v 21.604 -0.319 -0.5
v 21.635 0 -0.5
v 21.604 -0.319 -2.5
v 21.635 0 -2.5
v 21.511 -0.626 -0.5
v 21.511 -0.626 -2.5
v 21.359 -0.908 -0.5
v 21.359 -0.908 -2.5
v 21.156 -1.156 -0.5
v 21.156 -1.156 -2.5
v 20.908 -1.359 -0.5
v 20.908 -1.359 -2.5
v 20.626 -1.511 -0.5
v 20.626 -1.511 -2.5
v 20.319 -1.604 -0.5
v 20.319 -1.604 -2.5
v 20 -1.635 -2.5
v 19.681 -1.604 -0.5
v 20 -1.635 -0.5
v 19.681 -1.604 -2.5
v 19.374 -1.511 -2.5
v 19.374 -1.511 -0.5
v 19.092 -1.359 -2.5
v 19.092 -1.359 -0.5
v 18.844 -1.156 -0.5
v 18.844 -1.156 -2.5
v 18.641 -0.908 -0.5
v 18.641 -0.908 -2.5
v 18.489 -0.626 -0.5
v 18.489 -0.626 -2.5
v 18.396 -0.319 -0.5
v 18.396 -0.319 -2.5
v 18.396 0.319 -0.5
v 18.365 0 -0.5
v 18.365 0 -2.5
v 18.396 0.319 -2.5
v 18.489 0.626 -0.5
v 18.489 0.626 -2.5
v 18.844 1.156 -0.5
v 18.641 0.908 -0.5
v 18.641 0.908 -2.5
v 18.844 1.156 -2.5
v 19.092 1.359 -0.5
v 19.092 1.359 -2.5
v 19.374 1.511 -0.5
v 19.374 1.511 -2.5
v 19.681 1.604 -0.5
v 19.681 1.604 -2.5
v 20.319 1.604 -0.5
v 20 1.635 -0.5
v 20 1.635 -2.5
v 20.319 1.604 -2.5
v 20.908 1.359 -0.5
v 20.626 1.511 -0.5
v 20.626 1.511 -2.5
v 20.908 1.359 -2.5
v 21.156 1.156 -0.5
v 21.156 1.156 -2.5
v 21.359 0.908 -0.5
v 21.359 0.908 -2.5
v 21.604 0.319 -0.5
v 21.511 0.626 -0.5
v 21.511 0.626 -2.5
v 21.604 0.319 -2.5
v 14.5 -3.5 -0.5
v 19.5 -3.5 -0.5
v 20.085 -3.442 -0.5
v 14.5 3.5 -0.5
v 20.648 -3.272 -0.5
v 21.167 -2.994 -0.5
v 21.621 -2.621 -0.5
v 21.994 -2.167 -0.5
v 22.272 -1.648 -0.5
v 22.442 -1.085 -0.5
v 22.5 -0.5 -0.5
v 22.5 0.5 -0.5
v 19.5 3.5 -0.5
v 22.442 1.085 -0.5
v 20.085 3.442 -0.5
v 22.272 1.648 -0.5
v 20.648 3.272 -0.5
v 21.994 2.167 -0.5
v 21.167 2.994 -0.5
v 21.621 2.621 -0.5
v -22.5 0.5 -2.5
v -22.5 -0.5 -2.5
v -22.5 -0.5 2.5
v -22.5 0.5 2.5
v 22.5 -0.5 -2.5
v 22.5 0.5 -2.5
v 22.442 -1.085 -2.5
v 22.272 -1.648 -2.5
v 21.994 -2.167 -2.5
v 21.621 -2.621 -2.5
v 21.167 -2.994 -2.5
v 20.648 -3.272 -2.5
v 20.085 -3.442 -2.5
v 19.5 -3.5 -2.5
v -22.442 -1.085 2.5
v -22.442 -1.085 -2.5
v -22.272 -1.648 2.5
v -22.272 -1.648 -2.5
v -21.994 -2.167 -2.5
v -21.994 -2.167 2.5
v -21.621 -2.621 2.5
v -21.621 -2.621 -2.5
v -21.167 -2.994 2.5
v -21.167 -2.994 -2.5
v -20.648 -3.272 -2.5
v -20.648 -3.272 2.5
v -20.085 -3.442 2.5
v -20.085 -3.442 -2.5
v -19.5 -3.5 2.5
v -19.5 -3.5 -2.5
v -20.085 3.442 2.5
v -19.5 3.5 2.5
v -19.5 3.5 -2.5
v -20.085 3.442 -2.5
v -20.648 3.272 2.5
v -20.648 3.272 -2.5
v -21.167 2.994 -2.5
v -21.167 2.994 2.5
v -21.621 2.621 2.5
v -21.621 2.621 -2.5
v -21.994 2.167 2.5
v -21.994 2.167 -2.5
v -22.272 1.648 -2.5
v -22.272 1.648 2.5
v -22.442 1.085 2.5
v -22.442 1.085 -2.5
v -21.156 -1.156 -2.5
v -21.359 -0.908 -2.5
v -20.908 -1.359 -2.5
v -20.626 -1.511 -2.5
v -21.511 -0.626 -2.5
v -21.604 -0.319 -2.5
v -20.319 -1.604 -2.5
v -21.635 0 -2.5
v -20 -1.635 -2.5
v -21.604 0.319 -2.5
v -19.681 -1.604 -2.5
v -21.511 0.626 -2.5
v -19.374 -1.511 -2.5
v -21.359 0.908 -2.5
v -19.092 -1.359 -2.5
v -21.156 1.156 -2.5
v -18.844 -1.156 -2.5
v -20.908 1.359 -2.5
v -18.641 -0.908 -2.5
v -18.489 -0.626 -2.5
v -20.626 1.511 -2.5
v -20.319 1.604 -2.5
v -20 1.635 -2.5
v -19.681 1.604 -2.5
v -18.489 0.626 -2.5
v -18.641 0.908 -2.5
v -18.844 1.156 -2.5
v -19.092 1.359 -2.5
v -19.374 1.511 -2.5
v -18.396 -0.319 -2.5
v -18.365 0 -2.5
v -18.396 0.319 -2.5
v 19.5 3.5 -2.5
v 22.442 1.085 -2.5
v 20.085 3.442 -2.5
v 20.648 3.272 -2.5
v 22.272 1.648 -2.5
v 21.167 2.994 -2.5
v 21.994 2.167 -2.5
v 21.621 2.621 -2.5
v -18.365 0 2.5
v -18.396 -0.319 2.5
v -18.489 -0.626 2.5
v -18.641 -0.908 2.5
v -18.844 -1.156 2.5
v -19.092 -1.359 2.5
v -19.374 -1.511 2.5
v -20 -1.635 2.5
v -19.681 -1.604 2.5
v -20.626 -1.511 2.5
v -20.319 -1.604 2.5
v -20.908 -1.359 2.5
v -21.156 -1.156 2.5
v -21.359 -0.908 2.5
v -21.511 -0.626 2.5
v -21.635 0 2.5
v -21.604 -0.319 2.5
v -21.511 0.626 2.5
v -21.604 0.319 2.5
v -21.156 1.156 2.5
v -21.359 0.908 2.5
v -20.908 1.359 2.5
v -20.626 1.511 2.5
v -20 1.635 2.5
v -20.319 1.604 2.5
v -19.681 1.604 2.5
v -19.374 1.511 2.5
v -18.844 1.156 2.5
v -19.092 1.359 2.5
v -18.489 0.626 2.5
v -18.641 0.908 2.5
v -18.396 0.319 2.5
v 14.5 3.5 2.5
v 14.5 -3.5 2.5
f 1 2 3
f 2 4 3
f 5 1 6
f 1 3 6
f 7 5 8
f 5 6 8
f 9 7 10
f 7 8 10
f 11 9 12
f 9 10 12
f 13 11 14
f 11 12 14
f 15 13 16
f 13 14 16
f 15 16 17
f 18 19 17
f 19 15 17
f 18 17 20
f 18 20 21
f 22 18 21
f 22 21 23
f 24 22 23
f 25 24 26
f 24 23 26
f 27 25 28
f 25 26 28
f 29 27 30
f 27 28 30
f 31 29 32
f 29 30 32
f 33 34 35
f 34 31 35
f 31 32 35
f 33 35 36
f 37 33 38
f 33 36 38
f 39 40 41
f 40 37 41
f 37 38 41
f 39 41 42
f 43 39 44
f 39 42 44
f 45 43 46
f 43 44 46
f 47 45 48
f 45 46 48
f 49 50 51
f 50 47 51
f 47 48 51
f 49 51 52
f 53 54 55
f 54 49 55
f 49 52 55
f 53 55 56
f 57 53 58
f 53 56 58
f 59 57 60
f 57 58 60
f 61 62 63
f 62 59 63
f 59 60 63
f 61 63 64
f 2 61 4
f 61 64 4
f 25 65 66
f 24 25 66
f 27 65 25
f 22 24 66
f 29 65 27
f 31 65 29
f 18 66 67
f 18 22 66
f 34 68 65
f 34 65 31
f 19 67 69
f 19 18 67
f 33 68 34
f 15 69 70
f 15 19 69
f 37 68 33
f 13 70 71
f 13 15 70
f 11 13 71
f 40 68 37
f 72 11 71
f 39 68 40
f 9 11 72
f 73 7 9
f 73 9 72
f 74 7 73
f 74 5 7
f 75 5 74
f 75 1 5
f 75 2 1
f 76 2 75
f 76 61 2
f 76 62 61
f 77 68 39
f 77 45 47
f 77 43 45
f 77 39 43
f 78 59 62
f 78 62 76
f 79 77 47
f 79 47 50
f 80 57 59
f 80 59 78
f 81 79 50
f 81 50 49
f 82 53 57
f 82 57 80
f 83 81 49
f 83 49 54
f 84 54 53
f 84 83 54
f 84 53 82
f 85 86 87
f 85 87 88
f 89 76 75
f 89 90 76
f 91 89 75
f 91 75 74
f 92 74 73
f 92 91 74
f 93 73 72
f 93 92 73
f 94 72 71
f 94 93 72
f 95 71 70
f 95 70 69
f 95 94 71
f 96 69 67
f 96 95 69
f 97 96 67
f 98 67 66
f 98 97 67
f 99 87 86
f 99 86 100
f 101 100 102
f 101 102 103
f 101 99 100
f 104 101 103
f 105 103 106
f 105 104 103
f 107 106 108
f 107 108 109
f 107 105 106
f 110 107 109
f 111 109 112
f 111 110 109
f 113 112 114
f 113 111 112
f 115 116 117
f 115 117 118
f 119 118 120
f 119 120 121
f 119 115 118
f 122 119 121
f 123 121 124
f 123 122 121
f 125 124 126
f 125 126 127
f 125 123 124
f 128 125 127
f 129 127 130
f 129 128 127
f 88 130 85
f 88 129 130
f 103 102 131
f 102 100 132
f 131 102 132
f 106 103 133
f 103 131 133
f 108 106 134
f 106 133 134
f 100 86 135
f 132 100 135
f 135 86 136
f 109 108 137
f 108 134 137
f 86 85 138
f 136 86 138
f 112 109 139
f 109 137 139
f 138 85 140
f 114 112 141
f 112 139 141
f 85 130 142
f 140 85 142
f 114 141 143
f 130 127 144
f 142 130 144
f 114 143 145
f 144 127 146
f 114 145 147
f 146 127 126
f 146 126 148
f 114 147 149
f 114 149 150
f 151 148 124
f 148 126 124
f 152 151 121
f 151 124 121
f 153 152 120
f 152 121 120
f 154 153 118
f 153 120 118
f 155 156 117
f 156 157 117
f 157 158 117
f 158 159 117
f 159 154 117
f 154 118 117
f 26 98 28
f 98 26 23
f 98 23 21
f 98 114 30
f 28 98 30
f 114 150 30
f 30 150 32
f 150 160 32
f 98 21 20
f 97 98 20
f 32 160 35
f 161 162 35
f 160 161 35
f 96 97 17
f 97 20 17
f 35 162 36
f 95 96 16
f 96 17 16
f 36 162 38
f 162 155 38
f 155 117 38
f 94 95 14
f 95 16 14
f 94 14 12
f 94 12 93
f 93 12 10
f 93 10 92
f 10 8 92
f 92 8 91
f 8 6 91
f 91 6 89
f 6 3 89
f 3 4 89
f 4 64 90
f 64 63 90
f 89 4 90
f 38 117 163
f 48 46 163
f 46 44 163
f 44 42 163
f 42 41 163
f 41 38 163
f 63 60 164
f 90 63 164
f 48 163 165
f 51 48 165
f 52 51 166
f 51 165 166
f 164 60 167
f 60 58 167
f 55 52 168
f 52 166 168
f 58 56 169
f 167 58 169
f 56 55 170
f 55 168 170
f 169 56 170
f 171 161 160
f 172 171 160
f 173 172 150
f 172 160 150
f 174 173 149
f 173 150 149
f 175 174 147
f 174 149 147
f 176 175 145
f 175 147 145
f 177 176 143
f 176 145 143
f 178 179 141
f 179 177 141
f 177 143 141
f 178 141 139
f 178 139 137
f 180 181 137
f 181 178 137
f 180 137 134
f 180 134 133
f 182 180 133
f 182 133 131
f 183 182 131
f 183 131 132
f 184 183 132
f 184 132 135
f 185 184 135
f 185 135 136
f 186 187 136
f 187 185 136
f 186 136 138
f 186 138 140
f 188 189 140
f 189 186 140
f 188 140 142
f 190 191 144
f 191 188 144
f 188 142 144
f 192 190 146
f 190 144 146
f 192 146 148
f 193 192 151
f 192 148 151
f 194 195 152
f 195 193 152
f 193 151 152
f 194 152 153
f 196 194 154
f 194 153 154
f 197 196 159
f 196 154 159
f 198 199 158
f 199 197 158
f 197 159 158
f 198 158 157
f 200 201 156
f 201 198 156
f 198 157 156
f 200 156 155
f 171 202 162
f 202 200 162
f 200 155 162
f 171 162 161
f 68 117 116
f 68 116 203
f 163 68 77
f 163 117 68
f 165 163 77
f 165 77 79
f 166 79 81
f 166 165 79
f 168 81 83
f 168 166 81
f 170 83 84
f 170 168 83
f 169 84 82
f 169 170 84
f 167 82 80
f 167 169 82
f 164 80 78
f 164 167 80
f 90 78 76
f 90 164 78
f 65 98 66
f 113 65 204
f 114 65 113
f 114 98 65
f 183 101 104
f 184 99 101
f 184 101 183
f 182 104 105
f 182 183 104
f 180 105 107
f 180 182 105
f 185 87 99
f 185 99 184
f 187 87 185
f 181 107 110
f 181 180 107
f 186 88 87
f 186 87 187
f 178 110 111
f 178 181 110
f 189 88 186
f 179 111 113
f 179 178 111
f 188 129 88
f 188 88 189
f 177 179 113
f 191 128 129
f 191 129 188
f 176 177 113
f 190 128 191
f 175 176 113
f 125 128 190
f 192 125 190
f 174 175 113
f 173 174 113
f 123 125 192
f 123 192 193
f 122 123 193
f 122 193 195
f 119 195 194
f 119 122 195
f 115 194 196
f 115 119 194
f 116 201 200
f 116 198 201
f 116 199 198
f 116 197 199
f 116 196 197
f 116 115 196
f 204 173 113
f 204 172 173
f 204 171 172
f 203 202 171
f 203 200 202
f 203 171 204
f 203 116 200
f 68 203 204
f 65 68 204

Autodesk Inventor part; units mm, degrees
ref_plane "YZ Plane" through (0, 0, 0) normal (1, 0, 0) x (0, 1, 0)
ref_plane "XZ Plane" through (0, 0, 0) normal (0, 1, 0) x (-1, 0, 0)
ref_plane "XY Plane" through (0, 0, 0) normal (0, 0, 1) x (1, 0, 0)
sketch "スケッチ1" plane through (0, 0, 0) normal (0, 0, 1) x (1, 0, 0)
  line L0 (-22.5, 3.5) -> (22.5, 3.5)
  line L1 (22.5, 3.5) -> (22.5, -3.5)
  line L2 (22.5, -3.5) -> (-22.5, -3.5)
  line L3 (-22.5, -3.5) -> (-22.5, 3.5)
  line L4 (-22.5, 3.5) -> (22.5, -3.5) construction
  line L5 (22.5, 3.5) -> (-22.5, -3.5) construction
  line L6 (0, -6.37) -> (0, 6.37) construction
  line L7 (-34.37, 0) -> (34.37, 0) construction
  circle A0 centre (-20, 0) radius 4.55
  line L8 (22.5, -3.5) -> (22.5, 3.5)
  circle A1 centre (20, 0) radius 4.55
  circle A2 centre (-20, 0) radius 1.635
  circle A3 centre (20, 0) radius 1.635
  line L9 (14.5, 3.5) -> (14.5, -3.5)
  point P0 (0, 0)
  point P1 (-17.0927, 3.5)
  point P2 (-22.9073, 3.5)
  point P3 (-22.9073, -3.5)
  point P4 (-17.0927, -3.5)
  point P5 (17.0927, 3.5)
  point P6 (17.0927, -3.5)
  point P7 (22.9073, -3.5)
  point P8 (22.9073, 3.5)
  dimension "d1" = 7
  dimension "d2" = 20
  dimension "d3" = 45
  dimension "d4" = 9.1
  dimension "d12" = 3.27
  dimension "d13" = 8
  dimension "d16" = 3.27
extrude "押し出し1" add sketch "スケッチ1" along normal mid plane 5 contours L0 A0 L2 L3 | L0 L9 L2 A0 | L0 A1 L2 L9 | L0 L1 L2 A1 picked at (-19.7985, 2.8744) picked at (19.7985, -2.8744)
fillet "フィレット1" radius 3 4 edges at (-22.5, 3.5, 0) (-22.5, -3.5, 0) (22.5, -3.5, 0) (22.5, 3.5, 0)
extrude "押し出し3" cut sketch "スケッチ1" against normal blind 3 from surface at 2.5 contours L0 A1 L2 L9 | L0 L1 L2 A1 picked at (19.7985, -2.8744)
properties part number "link_arm_1"
